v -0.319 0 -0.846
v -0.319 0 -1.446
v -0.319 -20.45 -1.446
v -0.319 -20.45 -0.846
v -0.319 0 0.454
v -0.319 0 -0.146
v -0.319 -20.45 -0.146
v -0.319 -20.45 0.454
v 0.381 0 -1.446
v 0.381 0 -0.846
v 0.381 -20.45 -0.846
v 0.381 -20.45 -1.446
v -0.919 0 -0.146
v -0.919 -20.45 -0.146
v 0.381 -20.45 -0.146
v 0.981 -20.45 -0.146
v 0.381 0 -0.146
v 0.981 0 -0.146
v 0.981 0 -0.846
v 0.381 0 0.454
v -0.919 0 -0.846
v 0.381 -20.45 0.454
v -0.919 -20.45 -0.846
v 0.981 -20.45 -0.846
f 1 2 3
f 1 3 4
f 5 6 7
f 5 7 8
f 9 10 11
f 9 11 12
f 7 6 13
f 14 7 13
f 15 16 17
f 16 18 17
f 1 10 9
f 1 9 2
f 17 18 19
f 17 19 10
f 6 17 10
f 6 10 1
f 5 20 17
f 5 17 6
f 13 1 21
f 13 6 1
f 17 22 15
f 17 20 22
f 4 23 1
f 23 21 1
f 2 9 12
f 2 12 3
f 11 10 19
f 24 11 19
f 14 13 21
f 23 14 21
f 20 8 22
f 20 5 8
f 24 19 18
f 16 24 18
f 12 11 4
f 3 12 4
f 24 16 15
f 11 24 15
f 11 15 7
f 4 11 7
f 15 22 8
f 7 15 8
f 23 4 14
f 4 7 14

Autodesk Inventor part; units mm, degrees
ref_plane "YZ Plane" through (0, 0, 0) normal (1, 0, 0) x (0, 1, 0)
ref_plane "XZ Plane" through (0, 0, 0) normal (0, 1, 0) x (-1, 0, 0)
ref_plane "XY Plane" through (0, 0, 0) normal (0, 0, 1) x (1, 0, 0)
sketch "Esquisse1" plane through (0, 0, 0) normal (0, 1, 0) x (-1, 0, 0)
  line L0 (0.3187, 0.4542) -> (-0.3813, 0.4542)
  line L1 (-0.3813, 0.4542) -> (-0.3813, -1.4458)
  line L2 (-0.3813, -1.4458) -> (0.3187, -1.4458)
  line L3 (0.3187, -1.4458) -> (0.3187, 0.4542)
  line L4 (0.9187, -0.8458) -> (-0.9813, -0.8458)
  line L5 (-0.9813, -0.8458) -> (-0.9813, -0.1458)
  line L6 (-0.9813, -0.1458) -> (0.9187, -0.1458)
  line L7 (0.9187, -0.1458) -> (0.9187, -0.8458)
  point P0 (0, 0)
  dimension "d0" = 0.7
  dimension "d1" = 0.7
  dimension "d2" = 1.9
  dimension "d3" = 1.9
  dimension "d4" = 0.6
  dimension "d5" = 0.6
extrude "Extrusion1" add sketch "Esquisse1" against normal blind 20.45
properties part number "Croisillon"
